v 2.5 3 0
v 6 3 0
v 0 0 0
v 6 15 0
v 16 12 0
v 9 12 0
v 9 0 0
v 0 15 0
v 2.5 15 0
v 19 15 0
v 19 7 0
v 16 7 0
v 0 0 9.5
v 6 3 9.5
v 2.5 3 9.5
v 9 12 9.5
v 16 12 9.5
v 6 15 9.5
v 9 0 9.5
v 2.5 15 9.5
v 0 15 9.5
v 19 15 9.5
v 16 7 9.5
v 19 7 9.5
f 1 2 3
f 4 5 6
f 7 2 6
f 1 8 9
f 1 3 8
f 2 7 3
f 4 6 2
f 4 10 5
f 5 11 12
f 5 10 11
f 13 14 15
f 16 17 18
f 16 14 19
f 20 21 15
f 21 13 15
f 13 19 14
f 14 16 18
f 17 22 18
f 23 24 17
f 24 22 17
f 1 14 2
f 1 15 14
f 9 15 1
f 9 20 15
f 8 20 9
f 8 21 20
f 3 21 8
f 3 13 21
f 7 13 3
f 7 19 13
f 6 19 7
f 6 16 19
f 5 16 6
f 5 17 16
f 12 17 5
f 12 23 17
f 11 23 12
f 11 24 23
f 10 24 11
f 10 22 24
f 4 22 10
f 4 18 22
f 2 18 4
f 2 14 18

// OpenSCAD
// file: ../assets/hook.scad
include <hanger.scad>


/** \module hook_polygon
 * This module draw 2D hook polygon for glued it to hanger polygon and make
 * simple hook module.
 * @param width Width of the hook
 * @param height Height of the hook
 * @param thickness Thickness of the hook
 */
module hook_polygon(width, height, thickness) {
    polygon([
        [0, height],
        [0, height - thickness],
        [width - thickness,  height - thickness],
        [width - thickness, 0],
        [width, 0],
        [width, height],
    ]);
}

/** \module
 * This module draw 3D solid of the hook with the hanger to mount it on the
 * performated wall.
 * @param width Width of the hook (without hanger)
 * @param height Height of the hook block (without hanger)
 * @param thickness Thickness of the hook
 * @param hole_width Width of the hole in wall
 * @param hole_height Height of the hole in wall
 */
module hook_solid(width, height, thickness, hole_width, hole_height) {
    linear_extrude(hole_width - 0.5) {
        hanger_polygon(hole_height, thickness);
    
        translate([thickness * 3, hole_height - height]) {
            hook_polygon(width, height, thickness);
        }
    }
}
// file: ../assets/hanger.scad
/** \module hanger_solid
 * This module create 3D solid for hanger to mount it on performated wall,
 * it can be glued to objects that would be placed on that wall.
 * @param width Width of the hanger, it must be less or equal to hole width
 * @param height Height of the hanger, it must be less to hole height 
 * @param thickness Thickness of the wall
 */
module hanger_solid(width, height, thickness) {
    linear_extrude(width - 0.5) {
        hanger_polygon(height, thickness);
    }
}

/** \module hanger_polygon
 * This module create 2D polygon for hanger, to use in models, that is 2D to
 * glued it before extrude.
 * @param height Height of the hanger, it must be less to hole height 
 * @param thickness Thickness of the wall
 */
module hanger_polygon(height, thickness) {
    polygon([
        [0, height],
        [0, 0],
        [thickness * 3, 0],
        [thickness * 3, height],
        [thickness * 2, height],
        [thickness * 2, thickness],
        [thickness - 0.5, thickness],
        [thickness - 0.5, height],
    ]);
}

/** \module hanger_hole
 * This module draw hole for mount the hanger on wall. It require width and
 * height, and it must be same as in hanger, because when it is not the same, 
 * hanger would not suite to the hole.
 * @param width Width of the hole
 * @param height Height of the hole
 */
module hanger_hole(width, height) {
    square([width, height]);
}
// main file
include <../assets/hanger.scad>
include <../assets/hook.scad>

/* Variables from command line */
width = 10;
height = 8;
thickness = 3;
hole_width = 10;
hole_height = 15;

/* Draw hook */
hook_solid(width, height, thickness, hole_width, hole_height);
